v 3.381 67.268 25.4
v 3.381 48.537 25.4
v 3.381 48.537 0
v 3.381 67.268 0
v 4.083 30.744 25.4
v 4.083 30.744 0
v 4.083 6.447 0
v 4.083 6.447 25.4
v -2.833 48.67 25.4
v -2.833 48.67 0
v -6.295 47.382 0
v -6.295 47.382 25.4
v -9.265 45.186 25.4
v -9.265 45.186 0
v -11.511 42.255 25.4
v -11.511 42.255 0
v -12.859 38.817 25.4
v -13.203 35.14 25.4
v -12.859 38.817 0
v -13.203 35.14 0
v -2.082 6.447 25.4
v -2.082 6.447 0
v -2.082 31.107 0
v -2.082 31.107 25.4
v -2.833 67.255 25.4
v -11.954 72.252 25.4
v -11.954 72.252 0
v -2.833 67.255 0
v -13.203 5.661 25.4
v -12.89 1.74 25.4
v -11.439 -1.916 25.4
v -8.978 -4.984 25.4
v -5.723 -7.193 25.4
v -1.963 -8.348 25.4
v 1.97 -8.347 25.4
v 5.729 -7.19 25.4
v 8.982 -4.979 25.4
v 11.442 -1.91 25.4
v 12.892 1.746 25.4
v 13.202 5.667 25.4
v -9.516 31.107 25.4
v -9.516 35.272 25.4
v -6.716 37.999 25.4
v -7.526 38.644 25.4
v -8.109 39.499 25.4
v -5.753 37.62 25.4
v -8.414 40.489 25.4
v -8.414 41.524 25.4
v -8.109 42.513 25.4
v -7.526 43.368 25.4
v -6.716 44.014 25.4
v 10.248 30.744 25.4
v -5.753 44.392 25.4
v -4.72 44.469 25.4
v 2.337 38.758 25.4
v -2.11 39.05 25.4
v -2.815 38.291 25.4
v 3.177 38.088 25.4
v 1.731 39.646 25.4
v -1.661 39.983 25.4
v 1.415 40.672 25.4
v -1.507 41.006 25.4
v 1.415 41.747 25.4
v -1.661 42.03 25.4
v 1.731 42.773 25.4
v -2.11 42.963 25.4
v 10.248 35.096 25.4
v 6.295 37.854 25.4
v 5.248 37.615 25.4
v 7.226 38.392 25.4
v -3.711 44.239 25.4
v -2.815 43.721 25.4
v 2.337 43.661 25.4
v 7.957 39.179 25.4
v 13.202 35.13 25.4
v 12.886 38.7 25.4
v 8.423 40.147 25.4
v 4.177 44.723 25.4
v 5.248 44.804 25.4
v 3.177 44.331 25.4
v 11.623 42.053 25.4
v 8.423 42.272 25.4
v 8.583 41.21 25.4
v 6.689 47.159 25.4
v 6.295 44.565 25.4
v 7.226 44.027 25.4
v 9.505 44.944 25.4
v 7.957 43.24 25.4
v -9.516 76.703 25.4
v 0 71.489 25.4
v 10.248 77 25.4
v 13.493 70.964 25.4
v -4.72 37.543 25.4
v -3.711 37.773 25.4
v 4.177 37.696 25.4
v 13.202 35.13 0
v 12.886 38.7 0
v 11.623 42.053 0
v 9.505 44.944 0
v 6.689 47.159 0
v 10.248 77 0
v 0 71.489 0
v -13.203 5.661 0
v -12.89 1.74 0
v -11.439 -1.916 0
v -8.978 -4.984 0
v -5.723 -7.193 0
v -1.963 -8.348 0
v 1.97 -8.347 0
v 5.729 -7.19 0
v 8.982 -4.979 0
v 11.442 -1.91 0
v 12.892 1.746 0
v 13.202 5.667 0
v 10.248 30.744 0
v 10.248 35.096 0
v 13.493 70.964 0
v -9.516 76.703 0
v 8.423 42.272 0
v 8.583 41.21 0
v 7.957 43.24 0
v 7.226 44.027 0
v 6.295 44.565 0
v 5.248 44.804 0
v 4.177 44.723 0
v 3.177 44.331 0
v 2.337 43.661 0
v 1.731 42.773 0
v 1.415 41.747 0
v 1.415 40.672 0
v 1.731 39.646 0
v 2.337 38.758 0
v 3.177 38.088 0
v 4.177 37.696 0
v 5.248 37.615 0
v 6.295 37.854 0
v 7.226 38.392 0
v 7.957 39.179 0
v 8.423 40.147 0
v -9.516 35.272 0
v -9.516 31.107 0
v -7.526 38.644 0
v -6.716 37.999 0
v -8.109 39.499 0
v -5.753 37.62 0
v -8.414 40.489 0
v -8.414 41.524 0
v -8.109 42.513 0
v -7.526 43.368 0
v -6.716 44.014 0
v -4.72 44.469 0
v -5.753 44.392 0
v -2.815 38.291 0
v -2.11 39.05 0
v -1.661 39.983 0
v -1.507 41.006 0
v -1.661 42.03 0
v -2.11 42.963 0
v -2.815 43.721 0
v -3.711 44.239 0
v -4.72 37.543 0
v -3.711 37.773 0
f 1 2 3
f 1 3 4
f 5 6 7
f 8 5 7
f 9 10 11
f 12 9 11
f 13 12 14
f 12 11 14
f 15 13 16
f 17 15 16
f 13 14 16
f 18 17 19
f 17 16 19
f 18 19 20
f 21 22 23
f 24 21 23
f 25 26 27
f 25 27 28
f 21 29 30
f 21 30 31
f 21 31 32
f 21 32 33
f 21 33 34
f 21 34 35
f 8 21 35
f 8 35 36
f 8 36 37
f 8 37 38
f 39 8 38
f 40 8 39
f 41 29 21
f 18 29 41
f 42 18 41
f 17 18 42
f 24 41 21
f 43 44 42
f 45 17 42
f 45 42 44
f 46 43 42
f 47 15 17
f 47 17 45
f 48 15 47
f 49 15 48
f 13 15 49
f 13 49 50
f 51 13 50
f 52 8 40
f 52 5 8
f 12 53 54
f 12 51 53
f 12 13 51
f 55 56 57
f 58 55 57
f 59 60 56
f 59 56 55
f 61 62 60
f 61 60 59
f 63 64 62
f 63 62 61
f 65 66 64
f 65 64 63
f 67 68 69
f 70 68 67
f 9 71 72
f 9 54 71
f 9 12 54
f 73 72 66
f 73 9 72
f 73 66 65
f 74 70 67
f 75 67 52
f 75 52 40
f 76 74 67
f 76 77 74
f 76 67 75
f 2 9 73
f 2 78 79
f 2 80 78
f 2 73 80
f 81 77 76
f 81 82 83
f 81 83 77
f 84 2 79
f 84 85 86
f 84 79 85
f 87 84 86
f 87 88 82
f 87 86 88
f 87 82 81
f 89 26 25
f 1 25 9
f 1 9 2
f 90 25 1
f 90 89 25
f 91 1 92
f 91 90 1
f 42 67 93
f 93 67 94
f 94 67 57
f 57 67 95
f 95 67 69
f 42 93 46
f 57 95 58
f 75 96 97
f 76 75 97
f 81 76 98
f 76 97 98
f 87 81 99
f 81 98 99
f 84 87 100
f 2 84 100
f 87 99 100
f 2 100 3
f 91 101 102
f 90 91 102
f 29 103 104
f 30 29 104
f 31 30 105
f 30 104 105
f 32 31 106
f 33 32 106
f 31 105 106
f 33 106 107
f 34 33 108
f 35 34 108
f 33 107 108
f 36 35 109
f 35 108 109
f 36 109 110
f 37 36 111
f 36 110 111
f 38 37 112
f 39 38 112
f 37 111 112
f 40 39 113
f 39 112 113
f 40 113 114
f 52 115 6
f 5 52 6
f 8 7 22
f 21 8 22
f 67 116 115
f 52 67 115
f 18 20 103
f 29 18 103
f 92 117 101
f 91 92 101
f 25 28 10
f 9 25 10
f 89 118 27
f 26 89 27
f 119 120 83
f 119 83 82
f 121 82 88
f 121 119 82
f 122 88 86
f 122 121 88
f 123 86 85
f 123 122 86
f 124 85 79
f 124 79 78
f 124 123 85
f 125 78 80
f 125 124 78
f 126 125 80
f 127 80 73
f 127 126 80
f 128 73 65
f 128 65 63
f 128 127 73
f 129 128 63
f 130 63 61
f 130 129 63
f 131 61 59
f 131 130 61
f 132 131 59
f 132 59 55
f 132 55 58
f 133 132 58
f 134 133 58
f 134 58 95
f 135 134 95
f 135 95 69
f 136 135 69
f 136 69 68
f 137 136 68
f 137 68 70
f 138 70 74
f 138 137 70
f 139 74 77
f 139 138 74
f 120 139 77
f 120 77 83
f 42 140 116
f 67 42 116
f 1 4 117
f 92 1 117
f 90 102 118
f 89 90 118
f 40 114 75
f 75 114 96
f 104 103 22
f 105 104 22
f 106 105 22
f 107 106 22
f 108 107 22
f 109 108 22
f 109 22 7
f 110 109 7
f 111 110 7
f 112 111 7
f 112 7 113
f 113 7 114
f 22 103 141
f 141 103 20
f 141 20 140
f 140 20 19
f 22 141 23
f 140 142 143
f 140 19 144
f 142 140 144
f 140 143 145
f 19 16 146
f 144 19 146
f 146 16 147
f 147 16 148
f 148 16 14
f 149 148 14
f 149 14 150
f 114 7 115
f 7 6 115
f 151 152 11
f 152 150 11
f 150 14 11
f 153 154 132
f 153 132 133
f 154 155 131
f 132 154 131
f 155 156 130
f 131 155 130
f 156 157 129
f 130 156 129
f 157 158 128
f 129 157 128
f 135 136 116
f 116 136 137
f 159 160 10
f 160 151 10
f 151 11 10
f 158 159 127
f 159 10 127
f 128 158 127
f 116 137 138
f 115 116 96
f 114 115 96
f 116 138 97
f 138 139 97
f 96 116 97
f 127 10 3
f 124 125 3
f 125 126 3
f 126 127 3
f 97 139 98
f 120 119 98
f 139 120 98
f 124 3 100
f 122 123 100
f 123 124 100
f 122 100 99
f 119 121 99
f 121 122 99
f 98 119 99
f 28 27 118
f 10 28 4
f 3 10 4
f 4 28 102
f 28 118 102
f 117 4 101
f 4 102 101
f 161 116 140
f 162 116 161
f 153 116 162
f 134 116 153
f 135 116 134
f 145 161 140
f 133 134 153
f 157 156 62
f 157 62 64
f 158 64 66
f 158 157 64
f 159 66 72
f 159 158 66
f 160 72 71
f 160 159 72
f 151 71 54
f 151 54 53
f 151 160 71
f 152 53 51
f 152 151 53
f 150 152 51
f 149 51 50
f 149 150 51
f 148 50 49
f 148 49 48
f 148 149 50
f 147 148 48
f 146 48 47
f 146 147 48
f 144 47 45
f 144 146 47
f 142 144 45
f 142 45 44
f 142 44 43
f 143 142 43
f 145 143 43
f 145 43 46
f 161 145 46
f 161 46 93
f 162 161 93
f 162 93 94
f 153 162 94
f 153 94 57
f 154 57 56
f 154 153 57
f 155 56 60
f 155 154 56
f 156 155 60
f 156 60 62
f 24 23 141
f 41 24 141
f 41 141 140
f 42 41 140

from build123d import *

# Parameters (mm, degrees)
F0_R     = 3.472863
F0_R_2   = 3.604179
F1_DEPTH = 25.4


with BuildPart() as f1:
    # F0 (on Top) → F1 (new body)
    with BuildSketch(Plane.XY):
        with BuildLine():
            Line((13.202485, 5.667426), (13.202485, 35.130091))
            ThreePointArc((13.202485, 35.130091), (10.662539, 43.570376), (3.380966, 48.537108))
            Line((3.380966, 48.537108), (3.380966, 67.268364))
            Line((3.380966, 67.268364), (13.493051, 70.964341))
            Line((13.493051, 70.964341), (10.24771, 76.999515))
            Line((10.24771, 76.999515), (0, 71.488935))
            Line((0, 71.488935), (-9.516433, 76.70256))
            Line((-9.516433, 76.70256), (-11.954483, 72.252385))
            Line((-11.954483, 72.252385), (-2.833481, 67.2554))
            Line((-2.833481, 67.2554), (-2.833481, 48.669556))
            ThreePointArc((-2.833481, 48.669556), (-10.490695, 43.799697), (-13.202949, 35.139897))
            Line((-13.202949, 35.139897), (-13.202949, 5.660794))
            ThreePointArc((-13.202949, 5.660794), (0.003324, -8.493987), (13.202485, 5.667426))
        make_face()
        Polygon((-2.082214, 31.106506), (-9.516433, 31.106506), (-9.516433, 35.272334), (10.24771, 35.095599), (10.24771, 30.74386), (4.08275, 30.74386), (4.08275, 6.446655), (-2.082214, 6.446655), align=None, mode=Mode.SUBTRACT)
        with Locations((-4.979815, 41.006282)):
            Circle(F0_R, mode=Mode.SUBTRACT)
        with Locations((4.978646, 41.209515)):
            Circle(F0_R_2, mode=Mode.SUBTRACT)
    extrude(amount=F1_DEPTH)


solid = f1.part
